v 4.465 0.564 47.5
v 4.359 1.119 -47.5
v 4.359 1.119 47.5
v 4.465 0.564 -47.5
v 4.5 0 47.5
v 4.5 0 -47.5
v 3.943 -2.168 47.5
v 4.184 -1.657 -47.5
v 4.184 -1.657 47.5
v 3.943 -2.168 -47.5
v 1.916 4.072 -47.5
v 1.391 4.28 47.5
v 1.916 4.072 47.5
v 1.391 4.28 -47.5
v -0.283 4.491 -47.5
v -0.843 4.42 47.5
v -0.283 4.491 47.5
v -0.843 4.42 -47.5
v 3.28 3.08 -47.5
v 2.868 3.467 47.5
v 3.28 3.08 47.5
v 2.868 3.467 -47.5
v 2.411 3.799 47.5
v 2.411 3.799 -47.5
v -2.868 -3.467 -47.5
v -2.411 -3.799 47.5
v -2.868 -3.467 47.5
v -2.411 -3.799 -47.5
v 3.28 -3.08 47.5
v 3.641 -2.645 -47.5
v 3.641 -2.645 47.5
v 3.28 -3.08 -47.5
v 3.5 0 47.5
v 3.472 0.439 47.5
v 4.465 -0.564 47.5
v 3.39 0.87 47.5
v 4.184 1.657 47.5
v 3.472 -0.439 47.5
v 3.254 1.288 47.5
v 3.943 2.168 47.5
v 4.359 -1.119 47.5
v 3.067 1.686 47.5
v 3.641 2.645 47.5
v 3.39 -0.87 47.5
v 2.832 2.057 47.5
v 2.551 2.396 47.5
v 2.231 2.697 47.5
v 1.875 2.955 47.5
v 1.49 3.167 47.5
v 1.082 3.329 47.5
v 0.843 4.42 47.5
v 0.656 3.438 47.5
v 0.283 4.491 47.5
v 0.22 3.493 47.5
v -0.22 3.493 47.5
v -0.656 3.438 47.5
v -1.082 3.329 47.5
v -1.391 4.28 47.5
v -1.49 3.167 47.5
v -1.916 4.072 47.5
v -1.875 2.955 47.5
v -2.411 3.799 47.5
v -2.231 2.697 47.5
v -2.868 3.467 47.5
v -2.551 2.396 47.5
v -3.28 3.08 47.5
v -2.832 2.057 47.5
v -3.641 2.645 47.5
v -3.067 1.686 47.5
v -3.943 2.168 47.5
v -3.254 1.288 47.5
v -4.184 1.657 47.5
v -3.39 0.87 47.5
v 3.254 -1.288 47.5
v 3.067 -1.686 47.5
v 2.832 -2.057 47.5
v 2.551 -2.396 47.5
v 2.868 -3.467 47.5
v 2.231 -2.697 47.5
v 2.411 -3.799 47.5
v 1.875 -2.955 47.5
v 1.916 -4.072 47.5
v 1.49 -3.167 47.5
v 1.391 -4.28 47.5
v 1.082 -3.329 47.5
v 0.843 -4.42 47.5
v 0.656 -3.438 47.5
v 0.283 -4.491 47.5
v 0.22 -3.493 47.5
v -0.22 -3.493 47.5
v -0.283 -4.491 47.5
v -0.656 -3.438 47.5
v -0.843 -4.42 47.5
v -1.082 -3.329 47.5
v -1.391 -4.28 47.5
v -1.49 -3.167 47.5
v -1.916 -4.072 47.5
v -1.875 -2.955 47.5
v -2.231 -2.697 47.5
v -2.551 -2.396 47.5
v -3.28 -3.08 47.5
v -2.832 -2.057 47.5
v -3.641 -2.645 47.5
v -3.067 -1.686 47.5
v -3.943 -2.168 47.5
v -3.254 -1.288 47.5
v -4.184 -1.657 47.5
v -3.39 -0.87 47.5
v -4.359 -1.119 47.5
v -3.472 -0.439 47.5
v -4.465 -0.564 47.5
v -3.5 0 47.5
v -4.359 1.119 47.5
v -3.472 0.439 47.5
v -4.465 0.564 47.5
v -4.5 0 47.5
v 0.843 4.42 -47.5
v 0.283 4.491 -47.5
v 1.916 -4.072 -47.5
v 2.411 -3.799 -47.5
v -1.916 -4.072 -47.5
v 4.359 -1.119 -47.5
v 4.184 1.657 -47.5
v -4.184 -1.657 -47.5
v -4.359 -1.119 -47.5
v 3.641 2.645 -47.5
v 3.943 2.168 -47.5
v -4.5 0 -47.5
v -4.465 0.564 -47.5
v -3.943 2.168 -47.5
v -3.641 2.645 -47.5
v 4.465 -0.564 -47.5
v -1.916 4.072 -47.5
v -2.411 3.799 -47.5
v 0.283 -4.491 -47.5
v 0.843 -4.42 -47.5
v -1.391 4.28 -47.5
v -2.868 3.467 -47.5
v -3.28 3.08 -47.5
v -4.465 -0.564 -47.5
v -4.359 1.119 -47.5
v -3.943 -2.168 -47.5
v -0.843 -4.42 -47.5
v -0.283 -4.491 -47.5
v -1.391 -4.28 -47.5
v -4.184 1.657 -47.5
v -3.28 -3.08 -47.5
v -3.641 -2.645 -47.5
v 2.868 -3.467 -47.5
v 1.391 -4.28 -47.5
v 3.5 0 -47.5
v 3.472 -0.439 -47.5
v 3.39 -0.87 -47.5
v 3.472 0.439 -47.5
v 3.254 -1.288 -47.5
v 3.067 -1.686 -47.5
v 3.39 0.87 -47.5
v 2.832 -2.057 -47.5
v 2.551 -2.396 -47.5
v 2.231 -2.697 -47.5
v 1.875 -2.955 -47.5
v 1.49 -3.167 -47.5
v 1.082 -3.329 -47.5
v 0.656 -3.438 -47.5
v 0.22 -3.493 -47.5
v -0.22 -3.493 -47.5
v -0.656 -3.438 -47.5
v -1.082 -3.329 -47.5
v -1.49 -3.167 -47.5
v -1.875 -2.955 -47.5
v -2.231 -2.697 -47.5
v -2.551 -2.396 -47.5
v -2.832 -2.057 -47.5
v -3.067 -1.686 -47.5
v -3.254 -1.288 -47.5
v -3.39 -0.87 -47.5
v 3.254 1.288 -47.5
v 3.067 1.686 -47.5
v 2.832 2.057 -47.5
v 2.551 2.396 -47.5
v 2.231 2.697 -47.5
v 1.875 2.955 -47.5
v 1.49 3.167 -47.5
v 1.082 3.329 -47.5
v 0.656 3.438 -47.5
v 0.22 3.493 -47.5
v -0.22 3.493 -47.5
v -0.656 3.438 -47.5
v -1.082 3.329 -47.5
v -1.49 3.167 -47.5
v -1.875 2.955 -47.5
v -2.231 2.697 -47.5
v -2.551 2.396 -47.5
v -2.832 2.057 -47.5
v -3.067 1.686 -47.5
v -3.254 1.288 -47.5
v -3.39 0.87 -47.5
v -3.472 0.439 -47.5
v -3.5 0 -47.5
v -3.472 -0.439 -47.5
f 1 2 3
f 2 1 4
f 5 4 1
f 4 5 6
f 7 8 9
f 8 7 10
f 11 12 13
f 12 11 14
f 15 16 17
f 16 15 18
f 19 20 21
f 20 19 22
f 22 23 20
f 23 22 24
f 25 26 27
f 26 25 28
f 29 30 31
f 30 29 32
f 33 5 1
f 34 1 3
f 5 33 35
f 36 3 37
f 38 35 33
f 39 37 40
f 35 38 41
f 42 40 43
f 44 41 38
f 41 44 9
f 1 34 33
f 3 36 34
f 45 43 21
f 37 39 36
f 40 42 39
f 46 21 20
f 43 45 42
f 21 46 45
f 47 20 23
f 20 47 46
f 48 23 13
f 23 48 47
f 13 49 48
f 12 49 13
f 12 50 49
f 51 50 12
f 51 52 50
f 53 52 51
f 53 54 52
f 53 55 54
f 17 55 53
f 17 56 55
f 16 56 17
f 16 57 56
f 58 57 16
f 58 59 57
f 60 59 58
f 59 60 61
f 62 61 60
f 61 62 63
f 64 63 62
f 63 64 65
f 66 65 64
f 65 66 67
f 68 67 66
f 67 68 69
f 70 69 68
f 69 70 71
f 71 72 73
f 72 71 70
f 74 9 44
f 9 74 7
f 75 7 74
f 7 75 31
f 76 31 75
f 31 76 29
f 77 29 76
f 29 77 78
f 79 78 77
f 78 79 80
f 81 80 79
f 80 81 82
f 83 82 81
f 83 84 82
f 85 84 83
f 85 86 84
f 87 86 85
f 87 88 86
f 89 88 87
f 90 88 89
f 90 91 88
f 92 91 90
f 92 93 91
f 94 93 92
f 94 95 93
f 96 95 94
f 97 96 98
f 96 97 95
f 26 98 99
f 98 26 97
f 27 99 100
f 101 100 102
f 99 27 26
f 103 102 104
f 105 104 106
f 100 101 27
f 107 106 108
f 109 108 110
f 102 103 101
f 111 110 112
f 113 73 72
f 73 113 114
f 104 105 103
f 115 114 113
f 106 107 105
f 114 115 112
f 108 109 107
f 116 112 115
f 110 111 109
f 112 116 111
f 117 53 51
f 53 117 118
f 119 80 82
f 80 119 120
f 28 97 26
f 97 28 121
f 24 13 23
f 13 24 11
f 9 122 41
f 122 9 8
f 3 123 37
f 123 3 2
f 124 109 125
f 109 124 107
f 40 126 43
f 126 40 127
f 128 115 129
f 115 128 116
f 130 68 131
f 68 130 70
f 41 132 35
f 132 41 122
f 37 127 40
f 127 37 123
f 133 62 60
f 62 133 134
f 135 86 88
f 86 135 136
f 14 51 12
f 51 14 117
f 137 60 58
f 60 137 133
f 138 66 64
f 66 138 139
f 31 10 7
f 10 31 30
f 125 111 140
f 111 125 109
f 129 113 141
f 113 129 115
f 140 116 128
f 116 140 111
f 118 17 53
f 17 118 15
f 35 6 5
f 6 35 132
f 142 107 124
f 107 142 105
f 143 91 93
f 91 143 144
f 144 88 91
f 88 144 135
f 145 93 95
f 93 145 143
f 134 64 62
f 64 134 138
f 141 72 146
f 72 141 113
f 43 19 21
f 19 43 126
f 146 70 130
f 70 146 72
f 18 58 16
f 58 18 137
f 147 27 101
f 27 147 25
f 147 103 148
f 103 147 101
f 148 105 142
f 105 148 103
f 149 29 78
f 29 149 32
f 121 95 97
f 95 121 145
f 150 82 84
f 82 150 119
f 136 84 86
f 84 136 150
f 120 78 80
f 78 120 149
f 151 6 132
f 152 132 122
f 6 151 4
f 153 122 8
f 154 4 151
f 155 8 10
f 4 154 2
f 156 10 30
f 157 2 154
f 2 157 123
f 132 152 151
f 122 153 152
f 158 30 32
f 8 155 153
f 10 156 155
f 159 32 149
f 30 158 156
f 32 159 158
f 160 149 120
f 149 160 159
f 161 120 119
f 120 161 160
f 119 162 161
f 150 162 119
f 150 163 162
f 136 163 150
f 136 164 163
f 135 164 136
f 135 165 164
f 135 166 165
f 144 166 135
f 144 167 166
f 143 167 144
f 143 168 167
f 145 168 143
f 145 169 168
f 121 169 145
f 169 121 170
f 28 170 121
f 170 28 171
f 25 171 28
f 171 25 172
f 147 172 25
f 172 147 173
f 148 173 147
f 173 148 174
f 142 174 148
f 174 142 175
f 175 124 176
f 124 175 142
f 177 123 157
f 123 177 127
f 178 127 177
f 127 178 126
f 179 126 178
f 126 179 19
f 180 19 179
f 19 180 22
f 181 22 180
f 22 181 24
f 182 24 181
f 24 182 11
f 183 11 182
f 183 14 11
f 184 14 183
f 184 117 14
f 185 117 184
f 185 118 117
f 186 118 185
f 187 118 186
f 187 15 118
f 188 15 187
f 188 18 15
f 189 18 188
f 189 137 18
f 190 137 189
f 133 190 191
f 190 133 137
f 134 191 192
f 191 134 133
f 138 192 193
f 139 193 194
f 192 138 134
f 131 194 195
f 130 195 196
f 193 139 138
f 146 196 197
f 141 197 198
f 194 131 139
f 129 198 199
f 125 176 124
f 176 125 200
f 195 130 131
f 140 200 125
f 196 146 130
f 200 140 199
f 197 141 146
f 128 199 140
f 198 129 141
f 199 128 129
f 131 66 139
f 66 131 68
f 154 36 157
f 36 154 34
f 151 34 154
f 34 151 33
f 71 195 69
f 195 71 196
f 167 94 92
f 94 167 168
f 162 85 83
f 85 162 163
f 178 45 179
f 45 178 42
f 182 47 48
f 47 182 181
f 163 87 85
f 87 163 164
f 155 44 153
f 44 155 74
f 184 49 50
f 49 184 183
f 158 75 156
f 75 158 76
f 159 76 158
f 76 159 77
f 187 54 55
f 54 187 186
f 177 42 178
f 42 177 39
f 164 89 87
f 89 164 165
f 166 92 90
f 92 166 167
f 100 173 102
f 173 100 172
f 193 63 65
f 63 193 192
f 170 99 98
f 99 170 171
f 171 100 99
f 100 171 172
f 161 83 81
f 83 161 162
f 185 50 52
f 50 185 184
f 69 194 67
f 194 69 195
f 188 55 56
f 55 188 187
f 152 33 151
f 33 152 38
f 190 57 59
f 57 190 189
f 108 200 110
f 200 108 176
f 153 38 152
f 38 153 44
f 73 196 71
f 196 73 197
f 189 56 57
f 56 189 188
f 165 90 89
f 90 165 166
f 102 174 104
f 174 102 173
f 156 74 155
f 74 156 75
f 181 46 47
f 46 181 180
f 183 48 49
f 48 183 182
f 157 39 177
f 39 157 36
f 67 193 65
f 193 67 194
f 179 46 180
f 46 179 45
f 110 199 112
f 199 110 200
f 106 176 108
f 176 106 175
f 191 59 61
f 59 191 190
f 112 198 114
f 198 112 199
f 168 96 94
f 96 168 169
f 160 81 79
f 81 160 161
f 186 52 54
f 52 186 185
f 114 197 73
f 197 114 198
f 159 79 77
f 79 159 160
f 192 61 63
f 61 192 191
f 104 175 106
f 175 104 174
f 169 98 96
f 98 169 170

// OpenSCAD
$fn = 50;


difference() {
	union() {
		translate(v = [0, 0, -47.5000000000]) {
			cylinder(h = 95, r = 4.5000000000);
		}
	}
	union() {
		translate(v = [0, 0, -100.0000000000]) {
			cylinder(h = 200, r = 3.5000000000);
		}
	}
}
